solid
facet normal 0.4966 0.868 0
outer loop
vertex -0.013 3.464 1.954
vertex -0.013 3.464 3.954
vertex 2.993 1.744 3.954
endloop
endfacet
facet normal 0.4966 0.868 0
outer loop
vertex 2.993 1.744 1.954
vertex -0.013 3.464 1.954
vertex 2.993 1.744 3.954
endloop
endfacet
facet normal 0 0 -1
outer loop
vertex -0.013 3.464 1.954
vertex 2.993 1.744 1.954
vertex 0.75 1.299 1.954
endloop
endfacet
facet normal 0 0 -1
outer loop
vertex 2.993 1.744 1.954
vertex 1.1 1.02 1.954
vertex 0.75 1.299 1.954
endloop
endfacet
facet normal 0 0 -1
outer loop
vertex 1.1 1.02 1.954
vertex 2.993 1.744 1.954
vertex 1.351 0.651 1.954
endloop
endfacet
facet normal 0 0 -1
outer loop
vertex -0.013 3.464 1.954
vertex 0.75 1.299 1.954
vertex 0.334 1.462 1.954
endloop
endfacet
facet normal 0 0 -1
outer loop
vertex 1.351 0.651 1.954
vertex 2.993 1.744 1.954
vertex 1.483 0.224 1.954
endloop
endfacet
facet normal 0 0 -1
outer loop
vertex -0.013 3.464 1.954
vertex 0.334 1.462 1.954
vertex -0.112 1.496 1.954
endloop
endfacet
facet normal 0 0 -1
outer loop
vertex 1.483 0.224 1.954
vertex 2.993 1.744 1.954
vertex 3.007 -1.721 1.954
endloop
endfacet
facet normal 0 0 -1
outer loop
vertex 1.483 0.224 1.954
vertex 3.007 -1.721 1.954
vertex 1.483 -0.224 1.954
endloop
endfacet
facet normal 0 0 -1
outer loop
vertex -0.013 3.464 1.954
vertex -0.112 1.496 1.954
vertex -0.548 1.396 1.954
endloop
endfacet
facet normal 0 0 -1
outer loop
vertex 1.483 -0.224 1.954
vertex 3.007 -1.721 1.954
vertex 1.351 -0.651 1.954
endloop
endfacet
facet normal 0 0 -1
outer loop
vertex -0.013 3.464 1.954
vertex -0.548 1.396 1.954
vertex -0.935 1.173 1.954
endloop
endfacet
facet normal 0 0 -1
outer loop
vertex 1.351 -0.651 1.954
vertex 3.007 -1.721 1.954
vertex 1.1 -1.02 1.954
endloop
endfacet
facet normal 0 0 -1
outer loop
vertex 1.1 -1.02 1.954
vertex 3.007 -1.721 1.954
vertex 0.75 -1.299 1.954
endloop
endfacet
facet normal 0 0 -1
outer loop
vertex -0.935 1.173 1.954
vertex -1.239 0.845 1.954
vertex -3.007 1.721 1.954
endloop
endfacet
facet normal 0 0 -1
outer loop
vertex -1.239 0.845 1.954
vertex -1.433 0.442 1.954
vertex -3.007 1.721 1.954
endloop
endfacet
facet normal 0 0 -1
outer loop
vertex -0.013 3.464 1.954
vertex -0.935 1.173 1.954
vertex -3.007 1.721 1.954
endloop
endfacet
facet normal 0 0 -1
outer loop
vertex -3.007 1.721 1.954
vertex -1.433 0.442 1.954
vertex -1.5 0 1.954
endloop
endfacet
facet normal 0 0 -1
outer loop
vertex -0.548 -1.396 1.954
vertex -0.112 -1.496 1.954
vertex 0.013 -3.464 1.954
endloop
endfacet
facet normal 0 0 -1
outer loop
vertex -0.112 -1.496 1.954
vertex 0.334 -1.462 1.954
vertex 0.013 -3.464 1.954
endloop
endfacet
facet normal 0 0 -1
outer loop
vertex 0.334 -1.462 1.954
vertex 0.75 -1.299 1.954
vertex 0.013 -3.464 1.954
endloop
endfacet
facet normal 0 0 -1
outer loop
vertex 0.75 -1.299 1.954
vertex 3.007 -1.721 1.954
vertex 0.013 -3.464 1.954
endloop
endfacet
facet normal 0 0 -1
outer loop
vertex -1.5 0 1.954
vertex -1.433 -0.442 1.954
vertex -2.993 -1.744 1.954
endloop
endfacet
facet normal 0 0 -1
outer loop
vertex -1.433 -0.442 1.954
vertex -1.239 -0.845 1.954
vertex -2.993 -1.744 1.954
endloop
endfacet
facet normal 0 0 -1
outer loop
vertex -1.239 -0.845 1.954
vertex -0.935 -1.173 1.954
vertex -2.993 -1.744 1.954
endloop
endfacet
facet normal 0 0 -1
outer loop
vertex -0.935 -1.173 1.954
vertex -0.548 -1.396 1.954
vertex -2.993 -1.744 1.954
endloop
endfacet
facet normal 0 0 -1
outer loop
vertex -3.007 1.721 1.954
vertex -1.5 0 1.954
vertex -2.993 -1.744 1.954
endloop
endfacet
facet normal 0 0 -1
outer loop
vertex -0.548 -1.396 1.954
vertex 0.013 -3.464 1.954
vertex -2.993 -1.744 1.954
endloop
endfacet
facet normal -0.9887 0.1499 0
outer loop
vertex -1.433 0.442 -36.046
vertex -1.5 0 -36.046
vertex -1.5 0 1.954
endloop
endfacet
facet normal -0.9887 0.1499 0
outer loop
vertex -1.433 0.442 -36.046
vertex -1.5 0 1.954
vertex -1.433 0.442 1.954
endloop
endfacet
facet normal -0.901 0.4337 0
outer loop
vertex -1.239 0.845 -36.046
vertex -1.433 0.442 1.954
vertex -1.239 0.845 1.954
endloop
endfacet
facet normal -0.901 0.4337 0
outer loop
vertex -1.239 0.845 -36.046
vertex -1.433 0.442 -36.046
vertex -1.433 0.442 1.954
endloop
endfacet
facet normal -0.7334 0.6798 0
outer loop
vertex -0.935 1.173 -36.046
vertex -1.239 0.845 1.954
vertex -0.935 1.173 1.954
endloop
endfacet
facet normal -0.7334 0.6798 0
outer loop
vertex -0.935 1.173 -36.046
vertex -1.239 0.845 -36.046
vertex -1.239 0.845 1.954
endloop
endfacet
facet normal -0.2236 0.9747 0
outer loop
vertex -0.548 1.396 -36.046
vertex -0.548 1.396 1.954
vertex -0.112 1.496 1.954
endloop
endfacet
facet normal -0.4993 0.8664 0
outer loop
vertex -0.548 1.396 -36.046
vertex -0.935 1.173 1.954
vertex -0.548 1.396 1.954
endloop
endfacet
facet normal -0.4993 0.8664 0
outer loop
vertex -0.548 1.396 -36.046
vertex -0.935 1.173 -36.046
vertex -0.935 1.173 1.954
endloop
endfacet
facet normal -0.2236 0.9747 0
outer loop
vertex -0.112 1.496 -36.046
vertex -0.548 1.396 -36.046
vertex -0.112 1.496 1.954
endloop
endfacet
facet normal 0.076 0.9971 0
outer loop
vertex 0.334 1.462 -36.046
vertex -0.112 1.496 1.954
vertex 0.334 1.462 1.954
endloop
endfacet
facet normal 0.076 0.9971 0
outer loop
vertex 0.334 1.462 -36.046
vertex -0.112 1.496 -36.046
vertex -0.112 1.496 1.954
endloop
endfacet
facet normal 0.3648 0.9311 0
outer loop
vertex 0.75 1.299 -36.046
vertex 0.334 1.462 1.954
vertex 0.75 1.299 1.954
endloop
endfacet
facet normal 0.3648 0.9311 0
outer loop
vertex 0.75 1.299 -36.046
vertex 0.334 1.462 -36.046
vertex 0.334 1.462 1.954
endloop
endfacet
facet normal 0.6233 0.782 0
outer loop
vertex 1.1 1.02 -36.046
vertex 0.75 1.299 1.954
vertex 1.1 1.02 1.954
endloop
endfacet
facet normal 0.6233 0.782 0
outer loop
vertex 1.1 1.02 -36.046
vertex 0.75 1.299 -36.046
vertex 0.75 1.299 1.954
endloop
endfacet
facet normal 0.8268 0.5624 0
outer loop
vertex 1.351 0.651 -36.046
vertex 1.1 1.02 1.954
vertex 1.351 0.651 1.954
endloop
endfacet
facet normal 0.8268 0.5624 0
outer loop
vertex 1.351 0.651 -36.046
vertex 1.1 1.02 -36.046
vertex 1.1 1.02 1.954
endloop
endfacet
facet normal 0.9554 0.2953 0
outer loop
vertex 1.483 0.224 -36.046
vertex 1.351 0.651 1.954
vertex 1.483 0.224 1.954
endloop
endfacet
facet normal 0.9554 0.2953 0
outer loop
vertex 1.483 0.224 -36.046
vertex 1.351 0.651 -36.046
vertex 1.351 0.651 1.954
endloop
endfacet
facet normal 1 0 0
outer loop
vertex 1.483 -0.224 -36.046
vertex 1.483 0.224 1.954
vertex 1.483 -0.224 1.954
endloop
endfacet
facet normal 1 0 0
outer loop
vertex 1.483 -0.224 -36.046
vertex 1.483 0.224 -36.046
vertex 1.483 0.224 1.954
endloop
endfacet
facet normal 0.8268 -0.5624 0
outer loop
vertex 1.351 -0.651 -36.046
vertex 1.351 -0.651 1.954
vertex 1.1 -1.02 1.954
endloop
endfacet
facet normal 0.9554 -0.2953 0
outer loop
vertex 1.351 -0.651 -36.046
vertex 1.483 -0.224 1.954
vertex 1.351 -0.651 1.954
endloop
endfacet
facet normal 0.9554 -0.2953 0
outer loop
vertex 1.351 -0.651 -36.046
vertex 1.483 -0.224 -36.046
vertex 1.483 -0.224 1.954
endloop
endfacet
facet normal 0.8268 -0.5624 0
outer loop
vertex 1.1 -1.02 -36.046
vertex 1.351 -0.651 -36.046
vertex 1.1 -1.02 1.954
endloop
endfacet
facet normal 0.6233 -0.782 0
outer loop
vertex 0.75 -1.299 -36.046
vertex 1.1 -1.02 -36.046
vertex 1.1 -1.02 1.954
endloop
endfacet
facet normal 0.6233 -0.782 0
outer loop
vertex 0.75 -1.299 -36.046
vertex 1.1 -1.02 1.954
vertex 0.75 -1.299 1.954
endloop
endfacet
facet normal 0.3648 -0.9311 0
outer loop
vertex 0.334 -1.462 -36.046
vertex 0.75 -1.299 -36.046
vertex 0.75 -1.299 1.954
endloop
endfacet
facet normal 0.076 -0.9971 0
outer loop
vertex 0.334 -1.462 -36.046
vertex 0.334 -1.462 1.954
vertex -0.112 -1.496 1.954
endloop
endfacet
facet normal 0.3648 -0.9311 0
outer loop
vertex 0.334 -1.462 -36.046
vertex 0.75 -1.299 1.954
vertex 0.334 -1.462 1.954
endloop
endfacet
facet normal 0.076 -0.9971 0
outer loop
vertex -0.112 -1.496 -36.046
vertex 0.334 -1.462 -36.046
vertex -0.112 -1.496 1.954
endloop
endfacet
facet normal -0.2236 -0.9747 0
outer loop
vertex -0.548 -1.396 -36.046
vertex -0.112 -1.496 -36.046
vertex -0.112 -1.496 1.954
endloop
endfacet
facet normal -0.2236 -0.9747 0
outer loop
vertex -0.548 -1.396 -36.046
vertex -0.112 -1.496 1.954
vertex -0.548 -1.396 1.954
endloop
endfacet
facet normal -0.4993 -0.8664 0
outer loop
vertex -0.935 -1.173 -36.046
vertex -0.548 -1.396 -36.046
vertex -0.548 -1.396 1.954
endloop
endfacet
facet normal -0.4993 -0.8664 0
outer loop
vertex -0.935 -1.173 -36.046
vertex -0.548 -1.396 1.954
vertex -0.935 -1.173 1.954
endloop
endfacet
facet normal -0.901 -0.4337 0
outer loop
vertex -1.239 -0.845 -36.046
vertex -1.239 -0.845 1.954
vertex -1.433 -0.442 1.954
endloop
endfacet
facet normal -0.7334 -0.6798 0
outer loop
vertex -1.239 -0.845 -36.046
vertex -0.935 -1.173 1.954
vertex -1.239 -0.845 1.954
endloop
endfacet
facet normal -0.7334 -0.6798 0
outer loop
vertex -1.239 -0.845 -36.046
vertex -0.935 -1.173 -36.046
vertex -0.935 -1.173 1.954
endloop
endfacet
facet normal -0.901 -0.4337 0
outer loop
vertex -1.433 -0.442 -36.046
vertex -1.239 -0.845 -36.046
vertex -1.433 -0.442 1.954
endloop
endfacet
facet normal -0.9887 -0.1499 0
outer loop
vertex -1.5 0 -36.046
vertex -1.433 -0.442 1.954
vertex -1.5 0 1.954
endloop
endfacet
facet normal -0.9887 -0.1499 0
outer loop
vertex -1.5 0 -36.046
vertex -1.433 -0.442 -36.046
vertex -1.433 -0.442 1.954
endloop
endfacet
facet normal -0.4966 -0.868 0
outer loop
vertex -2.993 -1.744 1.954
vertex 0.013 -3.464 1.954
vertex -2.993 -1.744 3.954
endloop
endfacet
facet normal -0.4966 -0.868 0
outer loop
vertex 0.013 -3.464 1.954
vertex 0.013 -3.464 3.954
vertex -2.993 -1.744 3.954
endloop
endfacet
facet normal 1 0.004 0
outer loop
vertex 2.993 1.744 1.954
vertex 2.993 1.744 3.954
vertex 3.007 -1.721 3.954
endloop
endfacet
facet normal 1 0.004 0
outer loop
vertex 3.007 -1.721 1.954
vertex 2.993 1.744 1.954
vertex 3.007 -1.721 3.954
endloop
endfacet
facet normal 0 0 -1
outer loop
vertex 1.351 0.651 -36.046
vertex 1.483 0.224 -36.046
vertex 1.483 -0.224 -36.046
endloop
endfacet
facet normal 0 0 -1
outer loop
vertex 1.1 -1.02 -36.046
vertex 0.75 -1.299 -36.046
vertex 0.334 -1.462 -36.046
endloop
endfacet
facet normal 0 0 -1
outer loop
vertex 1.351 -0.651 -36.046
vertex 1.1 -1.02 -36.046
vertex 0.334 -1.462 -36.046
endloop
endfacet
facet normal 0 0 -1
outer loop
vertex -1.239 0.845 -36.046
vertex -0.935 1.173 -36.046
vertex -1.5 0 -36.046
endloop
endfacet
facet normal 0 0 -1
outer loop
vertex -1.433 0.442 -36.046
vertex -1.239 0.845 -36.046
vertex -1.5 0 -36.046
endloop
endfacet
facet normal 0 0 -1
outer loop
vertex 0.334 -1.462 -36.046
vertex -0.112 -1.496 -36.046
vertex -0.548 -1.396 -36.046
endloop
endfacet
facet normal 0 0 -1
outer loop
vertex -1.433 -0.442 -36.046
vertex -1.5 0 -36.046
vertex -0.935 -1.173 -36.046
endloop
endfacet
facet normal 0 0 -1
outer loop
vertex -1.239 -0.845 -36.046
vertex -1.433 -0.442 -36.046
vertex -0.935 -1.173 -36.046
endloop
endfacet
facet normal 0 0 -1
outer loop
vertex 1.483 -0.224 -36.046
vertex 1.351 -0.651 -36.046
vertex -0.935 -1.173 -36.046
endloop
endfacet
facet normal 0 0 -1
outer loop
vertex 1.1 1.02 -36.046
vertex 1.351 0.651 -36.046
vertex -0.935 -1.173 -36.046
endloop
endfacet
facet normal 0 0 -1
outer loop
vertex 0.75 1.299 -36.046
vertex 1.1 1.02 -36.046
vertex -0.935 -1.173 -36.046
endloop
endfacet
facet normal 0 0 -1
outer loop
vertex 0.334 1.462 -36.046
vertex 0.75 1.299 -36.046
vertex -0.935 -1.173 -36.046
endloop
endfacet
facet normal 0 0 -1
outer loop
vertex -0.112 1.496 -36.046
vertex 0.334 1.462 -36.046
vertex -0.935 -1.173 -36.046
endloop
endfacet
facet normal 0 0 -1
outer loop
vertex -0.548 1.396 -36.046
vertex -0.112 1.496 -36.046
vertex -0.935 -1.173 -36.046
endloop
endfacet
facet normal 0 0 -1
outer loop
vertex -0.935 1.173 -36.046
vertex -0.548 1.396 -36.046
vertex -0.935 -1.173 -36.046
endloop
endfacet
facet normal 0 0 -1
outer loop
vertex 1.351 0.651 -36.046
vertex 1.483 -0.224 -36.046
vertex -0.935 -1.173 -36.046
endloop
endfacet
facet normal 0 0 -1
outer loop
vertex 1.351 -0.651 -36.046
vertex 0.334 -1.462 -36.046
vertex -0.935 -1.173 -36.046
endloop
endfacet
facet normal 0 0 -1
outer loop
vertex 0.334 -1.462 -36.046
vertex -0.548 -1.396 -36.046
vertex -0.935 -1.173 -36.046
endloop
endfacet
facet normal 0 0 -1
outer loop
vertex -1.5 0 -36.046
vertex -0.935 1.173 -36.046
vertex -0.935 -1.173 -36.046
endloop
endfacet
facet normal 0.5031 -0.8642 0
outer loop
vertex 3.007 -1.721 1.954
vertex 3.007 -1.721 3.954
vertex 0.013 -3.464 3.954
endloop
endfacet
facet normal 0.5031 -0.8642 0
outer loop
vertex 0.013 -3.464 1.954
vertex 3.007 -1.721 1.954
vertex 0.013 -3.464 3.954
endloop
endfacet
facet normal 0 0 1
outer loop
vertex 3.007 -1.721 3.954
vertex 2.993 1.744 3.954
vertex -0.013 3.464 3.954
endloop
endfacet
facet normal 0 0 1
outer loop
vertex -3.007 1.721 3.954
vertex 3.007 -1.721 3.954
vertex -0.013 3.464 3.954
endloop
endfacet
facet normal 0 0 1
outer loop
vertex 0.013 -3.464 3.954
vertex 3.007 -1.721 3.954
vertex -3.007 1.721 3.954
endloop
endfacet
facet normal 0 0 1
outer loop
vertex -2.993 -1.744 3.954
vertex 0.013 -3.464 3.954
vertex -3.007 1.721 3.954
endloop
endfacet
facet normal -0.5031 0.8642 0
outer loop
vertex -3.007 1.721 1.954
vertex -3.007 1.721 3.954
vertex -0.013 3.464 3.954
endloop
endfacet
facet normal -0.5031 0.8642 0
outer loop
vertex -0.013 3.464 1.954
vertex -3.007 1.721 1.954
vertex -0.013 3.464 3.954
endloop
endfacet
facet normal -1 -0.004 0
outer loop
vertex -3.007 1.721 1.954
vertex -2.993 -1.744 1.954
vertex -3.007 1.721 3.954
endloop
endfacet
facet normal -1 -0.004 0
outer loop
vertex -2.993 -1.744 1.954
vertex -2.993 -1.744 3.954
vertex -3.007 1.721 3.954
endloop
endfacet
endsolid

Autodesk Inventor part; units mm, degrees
ref_plane "YZ Plane" through (0, 0, 0) normal (1, 0, 0) x (0, 1, 0)
ref_plane "XZ Plane" through (0, 0, 0) normal (0, 1, 0) x (-1, 0, 0)
ref_plane "XY Plane" through (0, 0, 0) normal (0, 0, 1) x (1, 0, 0)
sketch "Sketch1" plane through (0, 0, 0) normal (0, 1, 0) x (-1, 0, 0)
  line L0 (0, 3.9544) -> (10, 3.9544)
  line L1 (1.5, 1.9544) -> (1.5, -36.0456)
  line L2 (1.5, -36.0456) -> (0, -36.0456)
  line L3 (0, -36.0456) -> (0, 3.9544)
  line L4 (1.5, 1.9544) -> (10, 1.9544)
  line L5 (10, 3.9544) -> (10, 1.9544)
  point P0 (0, 0)
  dimension "d0" = 10
  dimension "d1" = 2
  dimension "d2" = 40
  dimension "d21" = 1.5
revolve "Revolution1" add sketch "Sketch1" angle 360 about axis through (0, 0, -36.0456) along (0, 0, 1)
thread "Thread2" size "M3x0.5" class "6g" standard "ANSI Metric M Profile" full length
sketch "Sketch5" plane through (0, 0, 3.9544) normal (0, 0, 1) x (1, 0, 0)
  line L0 (-3.0066, 1.7206) -> (-0.0132, 3.4641)
  line L1 (-0.0132, 3.4641) -> (2.9934, 1.7435)
  line L2 (2.9934, 1.7435) -> (3.0066, -1.7206)
  line L3 (3.0066, -1.7206) -> (0.0132, -3.4641)
  line L4 (0.0132, -3.4641) -> (-2.9934, -1.7435)
  line L5 (-2.9934, -1.7435) -> (-3.0066, 1.7206)
  circle A0 centre (0, 0) radius 18.6664
  dimension "d24" = 6
extrude "Extrusion1" cut sketch "Sketch5" against normal through all
properties part number "Fi3es60mmcsavar" material "Steel, Alloy"
